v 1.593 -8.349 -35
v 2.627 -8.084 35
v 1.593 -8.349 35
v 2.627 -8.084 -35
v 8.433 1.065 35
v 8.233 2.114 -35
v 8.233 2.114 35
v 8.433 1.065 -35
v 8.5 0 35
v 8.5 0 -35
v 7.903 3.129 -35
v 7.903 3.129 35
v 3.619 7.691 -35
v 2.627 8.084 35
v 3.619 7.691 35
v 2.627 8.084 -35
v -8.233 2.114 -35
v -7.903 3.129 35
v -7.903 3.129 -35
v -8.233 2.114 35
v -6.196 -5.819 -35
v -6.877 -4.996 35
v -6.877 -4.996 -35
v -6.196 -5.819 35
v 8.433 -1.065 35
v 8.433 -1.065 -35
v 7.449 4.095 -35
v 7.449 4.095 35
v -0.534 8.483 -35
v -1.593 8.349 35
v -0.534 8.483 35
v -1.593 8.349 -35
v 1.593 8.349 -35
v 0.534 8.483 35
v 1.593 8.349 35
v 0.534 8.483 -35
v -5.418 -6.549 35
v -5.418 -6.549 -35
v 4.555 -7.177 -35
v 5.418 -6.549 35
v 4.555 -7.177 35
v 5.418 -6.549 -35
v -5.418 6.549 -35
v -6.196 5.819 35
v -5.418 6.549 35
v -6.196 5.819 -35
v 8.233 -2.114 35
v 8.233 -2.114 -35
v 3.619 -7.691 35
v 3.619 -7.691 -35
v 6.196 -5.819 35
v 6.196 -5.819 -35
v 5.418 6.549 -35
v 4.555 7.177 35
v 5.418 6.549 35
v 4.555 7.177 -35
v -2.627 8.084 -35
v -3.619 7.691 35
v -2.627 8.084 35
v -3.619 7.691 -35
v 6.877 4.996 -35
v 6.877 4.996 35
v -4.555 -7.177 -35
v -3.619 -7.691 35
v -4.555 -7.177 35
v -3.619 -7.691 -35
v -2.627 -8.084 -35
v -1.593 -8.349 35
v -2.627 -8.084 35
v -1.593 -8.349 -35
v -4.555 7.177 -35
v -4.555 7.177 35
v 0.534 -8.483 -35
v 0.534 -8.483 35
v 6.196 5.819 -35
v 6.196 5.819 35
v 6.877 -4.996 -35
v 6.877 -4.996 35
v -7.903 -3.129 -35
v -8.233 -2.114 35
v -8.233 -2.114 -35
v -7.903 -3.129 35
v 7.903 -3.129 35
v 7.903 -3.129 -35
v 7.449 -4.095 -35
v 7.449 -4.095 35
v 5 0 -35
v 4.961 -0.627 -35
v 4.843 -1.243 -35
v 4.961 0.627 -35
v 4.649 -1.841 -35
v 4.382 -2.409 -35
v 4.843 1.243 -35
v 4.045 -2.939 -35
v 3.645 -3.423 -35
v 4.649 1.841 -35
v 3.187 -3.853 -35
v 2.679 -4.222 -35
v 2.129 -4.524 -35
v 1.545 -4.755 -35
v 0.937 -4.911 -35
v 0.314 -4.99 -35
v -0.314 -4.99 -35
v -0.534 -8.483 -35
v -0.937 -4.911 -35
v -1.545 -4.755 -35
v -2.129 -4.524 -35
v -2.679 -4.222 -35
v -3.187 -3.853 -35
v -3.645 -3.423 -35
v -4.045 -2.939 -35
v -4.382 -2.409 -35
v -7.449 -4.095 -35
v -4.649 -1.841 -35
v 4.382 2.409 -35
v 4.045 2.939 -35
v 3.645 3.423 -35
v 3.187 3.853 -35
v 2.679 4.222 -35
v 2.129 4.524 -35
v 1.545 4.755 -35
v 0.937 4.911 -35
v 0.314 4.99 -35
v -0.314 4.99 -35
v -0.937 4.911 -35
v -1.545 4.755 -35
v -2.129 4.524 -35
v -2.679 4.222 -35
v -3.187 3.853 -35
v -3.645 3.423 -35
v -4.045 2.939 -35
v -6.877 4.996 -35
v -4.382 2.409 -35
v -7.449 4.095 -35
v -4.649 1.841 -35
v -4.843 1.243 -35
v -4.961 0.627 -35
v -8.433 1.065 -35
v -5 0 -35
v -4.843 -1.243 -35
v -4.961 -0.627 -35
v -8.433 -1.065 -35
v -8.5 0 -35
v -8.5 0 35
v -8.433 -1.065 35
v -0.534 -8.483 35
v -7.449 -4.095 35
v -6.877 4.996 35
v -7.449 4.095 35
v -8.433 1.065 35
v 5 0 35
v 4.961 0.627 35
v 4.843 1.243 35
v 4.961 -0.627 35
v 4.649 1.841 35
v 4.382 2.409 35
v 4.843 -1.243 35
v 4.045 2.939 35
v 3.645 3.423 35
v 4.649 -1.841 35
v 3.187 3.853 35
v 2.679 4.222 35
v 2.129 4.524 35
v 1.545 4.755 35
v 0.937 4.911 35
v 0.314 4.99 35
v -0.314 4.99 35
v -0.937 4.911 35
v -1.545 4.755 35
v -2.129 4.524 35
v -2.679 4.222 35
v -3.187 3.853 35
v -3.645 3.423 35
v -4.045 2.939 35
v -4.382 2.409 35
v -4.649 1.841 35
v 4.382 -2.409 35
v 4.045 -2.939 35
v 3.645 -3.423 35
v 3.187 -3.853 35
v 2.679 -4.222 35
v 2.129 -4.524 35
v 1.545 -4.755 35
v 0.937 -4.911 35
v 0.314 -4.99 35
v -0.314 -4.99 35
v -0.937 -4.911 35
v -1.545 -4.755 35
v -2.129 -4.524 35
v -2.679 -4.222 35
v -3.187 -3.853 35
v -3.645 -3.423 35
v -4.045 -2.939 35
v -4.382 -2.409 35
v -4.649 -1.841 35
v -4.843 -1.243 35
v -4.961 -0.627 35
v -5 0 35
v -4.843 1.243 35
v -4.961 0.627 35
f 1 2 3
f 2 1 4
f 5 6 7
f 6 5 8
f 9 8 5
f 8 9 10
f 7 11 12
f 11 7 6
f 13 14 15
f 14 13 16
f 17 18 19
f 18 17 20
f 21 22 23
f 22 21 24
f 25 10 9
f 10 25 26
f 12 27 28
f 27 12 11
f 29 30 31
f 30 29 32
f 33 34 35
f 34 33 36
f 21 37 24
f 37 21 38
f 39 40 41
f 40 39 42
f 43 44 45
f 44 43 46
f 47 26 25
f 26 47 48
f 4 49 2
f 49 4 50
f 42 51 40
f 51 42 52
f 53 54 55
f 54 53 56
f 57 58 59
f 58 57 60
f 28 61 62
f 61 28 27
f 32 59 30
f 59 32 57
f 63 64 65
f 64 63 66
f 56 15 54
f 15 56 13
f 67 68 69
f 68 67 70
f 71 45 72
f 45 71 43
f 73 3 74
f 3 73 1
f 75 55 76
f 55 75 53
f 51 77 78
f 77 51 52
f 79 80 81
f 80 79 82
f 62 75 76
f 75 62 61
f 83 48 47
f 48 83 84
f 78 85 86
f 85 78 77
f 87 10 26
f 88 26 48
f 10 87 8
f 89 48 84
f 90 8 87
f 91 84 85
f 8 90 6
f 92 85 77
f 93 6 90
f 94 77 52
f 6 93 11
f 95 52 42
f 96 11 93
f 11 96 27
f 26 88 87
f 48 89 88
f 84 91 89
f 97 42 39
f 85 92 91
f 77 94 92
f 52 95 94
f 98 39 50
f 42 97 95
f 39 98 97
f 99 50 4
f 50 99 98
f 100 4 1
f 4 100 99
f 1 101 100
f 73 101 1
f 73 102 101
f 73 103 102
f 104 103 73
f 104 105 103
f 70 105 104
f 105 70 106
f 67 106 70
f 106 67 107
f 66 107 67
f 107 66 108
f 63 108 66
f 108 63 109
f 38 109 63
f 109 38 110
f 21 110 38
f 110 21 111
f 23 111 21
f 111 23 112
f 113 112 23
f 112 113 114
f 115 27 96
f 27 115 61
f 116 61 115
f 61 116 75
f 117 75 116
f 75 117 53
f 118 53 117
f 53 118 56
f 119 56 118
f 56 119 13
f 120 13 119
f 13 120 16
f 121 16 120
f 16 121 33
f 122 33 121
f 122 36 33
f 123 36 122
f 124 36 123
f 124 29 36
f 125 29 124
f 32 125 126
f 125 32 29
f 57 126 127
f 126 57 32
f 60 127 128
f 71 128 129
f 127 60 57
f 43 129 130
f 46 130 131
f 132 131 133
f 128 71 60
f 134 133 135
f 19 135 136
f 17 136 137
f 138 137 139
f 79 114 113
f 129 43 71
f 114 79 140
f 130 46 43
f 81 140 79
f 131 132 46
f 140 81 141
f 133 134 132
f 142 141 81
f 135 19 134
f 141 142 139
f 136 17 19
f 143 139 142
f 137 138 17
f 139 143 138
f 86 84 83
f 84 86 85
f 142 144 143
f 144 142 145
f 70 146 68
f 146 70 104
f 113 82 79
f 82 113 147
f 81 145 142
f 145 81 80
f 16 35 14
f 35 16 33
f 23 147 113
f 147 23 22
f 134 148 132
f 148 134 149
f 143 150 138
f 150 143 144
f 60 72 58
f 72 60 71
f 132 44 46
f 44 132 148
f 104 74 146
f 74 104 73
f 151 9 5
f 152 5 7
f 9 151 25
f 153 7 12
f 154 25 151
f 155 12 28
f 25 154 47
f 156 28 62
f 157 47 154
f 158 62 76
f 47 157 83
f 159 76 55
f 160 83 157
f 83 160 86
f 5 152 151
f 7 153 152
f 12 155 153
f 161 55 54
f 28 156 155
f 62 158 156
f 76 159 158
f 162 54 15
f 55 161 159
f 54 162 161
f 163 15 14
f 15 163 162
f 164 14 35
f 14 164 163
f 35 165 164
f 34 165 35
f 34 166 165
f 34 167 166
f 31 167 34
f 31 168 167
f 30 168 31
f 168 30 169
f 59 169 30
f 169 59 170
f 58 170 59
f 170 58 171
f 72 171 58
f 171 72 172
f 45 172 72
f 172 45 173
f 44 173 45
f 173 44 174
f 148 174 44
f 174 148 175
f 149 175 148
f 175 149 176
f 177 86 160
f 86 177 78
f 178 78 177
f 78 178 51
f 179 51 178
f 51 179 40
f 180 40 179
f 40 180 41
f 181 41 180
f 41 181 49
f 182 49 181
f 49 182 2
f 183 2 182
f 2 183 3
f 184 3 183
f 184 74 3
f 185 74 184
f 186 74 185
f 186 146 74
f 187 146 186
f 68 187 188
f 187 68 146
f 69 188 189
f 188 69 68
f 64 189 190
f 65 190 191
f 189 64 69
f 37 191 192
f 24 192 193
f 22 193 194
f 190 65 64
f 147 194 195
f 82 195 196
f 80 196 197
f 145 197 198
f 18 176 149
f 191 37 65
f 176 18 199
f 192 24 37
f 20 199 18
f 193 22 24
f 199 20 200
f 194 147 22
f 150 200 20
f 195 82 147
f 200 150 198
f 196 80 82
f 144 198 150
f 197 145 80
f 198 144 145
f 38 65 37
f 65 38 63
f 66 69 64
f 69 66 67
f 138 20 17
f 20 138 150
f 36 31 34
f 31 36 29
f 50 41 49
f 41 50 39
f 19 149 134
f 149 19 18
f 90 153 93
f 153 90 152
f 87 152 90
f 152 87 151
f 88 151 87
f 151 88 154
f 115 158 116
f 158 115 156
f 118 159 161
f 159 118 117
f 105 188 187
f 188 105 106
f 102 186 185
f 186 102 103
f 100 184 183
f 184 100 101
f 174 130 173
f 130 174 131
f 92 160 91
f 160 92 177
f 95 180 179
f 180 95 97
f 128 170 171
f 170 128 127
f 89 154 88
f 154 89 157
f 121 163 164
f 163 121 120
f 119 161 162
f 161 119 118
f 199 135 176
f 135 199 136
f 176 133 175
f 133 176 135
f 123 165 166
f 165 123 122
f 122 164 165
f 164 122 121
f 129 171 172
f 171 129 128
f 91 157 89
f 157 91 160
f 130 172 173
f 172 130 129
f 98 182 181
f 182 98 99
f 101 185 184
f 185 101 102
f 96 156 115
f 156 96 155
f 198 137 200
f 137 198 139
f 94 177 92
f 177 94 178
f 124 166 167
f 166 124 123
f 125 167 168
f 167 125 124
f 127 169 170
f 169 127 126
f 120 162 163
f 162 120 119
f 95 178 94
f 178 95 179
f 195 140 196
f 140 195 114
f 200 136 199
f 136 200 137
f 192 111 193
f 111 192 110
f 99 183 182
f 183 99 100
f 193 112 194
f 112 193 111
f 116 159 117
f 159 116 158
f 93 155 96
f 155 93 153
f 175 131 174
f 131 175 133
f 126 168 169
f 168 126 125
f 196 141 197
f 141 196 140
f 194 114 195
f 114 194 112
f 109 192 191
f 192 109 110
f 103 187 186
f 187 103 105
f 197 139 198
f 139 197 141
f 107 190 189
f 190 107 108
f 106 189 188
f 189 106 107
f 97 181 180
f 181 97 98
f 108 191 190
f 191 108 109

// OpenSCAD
$fn = 50;


difference() {
	union() {
		translate(v = [0, 0, -35.0000000000]) {
			cylinder(h = 70, r = 8.5000000000);
		}
	}
	union() {
		translate(v = [0, 0, -100.0000000000]) {
			cylinder(h = 200, r = 5.0000000000);
		}
	}
}
